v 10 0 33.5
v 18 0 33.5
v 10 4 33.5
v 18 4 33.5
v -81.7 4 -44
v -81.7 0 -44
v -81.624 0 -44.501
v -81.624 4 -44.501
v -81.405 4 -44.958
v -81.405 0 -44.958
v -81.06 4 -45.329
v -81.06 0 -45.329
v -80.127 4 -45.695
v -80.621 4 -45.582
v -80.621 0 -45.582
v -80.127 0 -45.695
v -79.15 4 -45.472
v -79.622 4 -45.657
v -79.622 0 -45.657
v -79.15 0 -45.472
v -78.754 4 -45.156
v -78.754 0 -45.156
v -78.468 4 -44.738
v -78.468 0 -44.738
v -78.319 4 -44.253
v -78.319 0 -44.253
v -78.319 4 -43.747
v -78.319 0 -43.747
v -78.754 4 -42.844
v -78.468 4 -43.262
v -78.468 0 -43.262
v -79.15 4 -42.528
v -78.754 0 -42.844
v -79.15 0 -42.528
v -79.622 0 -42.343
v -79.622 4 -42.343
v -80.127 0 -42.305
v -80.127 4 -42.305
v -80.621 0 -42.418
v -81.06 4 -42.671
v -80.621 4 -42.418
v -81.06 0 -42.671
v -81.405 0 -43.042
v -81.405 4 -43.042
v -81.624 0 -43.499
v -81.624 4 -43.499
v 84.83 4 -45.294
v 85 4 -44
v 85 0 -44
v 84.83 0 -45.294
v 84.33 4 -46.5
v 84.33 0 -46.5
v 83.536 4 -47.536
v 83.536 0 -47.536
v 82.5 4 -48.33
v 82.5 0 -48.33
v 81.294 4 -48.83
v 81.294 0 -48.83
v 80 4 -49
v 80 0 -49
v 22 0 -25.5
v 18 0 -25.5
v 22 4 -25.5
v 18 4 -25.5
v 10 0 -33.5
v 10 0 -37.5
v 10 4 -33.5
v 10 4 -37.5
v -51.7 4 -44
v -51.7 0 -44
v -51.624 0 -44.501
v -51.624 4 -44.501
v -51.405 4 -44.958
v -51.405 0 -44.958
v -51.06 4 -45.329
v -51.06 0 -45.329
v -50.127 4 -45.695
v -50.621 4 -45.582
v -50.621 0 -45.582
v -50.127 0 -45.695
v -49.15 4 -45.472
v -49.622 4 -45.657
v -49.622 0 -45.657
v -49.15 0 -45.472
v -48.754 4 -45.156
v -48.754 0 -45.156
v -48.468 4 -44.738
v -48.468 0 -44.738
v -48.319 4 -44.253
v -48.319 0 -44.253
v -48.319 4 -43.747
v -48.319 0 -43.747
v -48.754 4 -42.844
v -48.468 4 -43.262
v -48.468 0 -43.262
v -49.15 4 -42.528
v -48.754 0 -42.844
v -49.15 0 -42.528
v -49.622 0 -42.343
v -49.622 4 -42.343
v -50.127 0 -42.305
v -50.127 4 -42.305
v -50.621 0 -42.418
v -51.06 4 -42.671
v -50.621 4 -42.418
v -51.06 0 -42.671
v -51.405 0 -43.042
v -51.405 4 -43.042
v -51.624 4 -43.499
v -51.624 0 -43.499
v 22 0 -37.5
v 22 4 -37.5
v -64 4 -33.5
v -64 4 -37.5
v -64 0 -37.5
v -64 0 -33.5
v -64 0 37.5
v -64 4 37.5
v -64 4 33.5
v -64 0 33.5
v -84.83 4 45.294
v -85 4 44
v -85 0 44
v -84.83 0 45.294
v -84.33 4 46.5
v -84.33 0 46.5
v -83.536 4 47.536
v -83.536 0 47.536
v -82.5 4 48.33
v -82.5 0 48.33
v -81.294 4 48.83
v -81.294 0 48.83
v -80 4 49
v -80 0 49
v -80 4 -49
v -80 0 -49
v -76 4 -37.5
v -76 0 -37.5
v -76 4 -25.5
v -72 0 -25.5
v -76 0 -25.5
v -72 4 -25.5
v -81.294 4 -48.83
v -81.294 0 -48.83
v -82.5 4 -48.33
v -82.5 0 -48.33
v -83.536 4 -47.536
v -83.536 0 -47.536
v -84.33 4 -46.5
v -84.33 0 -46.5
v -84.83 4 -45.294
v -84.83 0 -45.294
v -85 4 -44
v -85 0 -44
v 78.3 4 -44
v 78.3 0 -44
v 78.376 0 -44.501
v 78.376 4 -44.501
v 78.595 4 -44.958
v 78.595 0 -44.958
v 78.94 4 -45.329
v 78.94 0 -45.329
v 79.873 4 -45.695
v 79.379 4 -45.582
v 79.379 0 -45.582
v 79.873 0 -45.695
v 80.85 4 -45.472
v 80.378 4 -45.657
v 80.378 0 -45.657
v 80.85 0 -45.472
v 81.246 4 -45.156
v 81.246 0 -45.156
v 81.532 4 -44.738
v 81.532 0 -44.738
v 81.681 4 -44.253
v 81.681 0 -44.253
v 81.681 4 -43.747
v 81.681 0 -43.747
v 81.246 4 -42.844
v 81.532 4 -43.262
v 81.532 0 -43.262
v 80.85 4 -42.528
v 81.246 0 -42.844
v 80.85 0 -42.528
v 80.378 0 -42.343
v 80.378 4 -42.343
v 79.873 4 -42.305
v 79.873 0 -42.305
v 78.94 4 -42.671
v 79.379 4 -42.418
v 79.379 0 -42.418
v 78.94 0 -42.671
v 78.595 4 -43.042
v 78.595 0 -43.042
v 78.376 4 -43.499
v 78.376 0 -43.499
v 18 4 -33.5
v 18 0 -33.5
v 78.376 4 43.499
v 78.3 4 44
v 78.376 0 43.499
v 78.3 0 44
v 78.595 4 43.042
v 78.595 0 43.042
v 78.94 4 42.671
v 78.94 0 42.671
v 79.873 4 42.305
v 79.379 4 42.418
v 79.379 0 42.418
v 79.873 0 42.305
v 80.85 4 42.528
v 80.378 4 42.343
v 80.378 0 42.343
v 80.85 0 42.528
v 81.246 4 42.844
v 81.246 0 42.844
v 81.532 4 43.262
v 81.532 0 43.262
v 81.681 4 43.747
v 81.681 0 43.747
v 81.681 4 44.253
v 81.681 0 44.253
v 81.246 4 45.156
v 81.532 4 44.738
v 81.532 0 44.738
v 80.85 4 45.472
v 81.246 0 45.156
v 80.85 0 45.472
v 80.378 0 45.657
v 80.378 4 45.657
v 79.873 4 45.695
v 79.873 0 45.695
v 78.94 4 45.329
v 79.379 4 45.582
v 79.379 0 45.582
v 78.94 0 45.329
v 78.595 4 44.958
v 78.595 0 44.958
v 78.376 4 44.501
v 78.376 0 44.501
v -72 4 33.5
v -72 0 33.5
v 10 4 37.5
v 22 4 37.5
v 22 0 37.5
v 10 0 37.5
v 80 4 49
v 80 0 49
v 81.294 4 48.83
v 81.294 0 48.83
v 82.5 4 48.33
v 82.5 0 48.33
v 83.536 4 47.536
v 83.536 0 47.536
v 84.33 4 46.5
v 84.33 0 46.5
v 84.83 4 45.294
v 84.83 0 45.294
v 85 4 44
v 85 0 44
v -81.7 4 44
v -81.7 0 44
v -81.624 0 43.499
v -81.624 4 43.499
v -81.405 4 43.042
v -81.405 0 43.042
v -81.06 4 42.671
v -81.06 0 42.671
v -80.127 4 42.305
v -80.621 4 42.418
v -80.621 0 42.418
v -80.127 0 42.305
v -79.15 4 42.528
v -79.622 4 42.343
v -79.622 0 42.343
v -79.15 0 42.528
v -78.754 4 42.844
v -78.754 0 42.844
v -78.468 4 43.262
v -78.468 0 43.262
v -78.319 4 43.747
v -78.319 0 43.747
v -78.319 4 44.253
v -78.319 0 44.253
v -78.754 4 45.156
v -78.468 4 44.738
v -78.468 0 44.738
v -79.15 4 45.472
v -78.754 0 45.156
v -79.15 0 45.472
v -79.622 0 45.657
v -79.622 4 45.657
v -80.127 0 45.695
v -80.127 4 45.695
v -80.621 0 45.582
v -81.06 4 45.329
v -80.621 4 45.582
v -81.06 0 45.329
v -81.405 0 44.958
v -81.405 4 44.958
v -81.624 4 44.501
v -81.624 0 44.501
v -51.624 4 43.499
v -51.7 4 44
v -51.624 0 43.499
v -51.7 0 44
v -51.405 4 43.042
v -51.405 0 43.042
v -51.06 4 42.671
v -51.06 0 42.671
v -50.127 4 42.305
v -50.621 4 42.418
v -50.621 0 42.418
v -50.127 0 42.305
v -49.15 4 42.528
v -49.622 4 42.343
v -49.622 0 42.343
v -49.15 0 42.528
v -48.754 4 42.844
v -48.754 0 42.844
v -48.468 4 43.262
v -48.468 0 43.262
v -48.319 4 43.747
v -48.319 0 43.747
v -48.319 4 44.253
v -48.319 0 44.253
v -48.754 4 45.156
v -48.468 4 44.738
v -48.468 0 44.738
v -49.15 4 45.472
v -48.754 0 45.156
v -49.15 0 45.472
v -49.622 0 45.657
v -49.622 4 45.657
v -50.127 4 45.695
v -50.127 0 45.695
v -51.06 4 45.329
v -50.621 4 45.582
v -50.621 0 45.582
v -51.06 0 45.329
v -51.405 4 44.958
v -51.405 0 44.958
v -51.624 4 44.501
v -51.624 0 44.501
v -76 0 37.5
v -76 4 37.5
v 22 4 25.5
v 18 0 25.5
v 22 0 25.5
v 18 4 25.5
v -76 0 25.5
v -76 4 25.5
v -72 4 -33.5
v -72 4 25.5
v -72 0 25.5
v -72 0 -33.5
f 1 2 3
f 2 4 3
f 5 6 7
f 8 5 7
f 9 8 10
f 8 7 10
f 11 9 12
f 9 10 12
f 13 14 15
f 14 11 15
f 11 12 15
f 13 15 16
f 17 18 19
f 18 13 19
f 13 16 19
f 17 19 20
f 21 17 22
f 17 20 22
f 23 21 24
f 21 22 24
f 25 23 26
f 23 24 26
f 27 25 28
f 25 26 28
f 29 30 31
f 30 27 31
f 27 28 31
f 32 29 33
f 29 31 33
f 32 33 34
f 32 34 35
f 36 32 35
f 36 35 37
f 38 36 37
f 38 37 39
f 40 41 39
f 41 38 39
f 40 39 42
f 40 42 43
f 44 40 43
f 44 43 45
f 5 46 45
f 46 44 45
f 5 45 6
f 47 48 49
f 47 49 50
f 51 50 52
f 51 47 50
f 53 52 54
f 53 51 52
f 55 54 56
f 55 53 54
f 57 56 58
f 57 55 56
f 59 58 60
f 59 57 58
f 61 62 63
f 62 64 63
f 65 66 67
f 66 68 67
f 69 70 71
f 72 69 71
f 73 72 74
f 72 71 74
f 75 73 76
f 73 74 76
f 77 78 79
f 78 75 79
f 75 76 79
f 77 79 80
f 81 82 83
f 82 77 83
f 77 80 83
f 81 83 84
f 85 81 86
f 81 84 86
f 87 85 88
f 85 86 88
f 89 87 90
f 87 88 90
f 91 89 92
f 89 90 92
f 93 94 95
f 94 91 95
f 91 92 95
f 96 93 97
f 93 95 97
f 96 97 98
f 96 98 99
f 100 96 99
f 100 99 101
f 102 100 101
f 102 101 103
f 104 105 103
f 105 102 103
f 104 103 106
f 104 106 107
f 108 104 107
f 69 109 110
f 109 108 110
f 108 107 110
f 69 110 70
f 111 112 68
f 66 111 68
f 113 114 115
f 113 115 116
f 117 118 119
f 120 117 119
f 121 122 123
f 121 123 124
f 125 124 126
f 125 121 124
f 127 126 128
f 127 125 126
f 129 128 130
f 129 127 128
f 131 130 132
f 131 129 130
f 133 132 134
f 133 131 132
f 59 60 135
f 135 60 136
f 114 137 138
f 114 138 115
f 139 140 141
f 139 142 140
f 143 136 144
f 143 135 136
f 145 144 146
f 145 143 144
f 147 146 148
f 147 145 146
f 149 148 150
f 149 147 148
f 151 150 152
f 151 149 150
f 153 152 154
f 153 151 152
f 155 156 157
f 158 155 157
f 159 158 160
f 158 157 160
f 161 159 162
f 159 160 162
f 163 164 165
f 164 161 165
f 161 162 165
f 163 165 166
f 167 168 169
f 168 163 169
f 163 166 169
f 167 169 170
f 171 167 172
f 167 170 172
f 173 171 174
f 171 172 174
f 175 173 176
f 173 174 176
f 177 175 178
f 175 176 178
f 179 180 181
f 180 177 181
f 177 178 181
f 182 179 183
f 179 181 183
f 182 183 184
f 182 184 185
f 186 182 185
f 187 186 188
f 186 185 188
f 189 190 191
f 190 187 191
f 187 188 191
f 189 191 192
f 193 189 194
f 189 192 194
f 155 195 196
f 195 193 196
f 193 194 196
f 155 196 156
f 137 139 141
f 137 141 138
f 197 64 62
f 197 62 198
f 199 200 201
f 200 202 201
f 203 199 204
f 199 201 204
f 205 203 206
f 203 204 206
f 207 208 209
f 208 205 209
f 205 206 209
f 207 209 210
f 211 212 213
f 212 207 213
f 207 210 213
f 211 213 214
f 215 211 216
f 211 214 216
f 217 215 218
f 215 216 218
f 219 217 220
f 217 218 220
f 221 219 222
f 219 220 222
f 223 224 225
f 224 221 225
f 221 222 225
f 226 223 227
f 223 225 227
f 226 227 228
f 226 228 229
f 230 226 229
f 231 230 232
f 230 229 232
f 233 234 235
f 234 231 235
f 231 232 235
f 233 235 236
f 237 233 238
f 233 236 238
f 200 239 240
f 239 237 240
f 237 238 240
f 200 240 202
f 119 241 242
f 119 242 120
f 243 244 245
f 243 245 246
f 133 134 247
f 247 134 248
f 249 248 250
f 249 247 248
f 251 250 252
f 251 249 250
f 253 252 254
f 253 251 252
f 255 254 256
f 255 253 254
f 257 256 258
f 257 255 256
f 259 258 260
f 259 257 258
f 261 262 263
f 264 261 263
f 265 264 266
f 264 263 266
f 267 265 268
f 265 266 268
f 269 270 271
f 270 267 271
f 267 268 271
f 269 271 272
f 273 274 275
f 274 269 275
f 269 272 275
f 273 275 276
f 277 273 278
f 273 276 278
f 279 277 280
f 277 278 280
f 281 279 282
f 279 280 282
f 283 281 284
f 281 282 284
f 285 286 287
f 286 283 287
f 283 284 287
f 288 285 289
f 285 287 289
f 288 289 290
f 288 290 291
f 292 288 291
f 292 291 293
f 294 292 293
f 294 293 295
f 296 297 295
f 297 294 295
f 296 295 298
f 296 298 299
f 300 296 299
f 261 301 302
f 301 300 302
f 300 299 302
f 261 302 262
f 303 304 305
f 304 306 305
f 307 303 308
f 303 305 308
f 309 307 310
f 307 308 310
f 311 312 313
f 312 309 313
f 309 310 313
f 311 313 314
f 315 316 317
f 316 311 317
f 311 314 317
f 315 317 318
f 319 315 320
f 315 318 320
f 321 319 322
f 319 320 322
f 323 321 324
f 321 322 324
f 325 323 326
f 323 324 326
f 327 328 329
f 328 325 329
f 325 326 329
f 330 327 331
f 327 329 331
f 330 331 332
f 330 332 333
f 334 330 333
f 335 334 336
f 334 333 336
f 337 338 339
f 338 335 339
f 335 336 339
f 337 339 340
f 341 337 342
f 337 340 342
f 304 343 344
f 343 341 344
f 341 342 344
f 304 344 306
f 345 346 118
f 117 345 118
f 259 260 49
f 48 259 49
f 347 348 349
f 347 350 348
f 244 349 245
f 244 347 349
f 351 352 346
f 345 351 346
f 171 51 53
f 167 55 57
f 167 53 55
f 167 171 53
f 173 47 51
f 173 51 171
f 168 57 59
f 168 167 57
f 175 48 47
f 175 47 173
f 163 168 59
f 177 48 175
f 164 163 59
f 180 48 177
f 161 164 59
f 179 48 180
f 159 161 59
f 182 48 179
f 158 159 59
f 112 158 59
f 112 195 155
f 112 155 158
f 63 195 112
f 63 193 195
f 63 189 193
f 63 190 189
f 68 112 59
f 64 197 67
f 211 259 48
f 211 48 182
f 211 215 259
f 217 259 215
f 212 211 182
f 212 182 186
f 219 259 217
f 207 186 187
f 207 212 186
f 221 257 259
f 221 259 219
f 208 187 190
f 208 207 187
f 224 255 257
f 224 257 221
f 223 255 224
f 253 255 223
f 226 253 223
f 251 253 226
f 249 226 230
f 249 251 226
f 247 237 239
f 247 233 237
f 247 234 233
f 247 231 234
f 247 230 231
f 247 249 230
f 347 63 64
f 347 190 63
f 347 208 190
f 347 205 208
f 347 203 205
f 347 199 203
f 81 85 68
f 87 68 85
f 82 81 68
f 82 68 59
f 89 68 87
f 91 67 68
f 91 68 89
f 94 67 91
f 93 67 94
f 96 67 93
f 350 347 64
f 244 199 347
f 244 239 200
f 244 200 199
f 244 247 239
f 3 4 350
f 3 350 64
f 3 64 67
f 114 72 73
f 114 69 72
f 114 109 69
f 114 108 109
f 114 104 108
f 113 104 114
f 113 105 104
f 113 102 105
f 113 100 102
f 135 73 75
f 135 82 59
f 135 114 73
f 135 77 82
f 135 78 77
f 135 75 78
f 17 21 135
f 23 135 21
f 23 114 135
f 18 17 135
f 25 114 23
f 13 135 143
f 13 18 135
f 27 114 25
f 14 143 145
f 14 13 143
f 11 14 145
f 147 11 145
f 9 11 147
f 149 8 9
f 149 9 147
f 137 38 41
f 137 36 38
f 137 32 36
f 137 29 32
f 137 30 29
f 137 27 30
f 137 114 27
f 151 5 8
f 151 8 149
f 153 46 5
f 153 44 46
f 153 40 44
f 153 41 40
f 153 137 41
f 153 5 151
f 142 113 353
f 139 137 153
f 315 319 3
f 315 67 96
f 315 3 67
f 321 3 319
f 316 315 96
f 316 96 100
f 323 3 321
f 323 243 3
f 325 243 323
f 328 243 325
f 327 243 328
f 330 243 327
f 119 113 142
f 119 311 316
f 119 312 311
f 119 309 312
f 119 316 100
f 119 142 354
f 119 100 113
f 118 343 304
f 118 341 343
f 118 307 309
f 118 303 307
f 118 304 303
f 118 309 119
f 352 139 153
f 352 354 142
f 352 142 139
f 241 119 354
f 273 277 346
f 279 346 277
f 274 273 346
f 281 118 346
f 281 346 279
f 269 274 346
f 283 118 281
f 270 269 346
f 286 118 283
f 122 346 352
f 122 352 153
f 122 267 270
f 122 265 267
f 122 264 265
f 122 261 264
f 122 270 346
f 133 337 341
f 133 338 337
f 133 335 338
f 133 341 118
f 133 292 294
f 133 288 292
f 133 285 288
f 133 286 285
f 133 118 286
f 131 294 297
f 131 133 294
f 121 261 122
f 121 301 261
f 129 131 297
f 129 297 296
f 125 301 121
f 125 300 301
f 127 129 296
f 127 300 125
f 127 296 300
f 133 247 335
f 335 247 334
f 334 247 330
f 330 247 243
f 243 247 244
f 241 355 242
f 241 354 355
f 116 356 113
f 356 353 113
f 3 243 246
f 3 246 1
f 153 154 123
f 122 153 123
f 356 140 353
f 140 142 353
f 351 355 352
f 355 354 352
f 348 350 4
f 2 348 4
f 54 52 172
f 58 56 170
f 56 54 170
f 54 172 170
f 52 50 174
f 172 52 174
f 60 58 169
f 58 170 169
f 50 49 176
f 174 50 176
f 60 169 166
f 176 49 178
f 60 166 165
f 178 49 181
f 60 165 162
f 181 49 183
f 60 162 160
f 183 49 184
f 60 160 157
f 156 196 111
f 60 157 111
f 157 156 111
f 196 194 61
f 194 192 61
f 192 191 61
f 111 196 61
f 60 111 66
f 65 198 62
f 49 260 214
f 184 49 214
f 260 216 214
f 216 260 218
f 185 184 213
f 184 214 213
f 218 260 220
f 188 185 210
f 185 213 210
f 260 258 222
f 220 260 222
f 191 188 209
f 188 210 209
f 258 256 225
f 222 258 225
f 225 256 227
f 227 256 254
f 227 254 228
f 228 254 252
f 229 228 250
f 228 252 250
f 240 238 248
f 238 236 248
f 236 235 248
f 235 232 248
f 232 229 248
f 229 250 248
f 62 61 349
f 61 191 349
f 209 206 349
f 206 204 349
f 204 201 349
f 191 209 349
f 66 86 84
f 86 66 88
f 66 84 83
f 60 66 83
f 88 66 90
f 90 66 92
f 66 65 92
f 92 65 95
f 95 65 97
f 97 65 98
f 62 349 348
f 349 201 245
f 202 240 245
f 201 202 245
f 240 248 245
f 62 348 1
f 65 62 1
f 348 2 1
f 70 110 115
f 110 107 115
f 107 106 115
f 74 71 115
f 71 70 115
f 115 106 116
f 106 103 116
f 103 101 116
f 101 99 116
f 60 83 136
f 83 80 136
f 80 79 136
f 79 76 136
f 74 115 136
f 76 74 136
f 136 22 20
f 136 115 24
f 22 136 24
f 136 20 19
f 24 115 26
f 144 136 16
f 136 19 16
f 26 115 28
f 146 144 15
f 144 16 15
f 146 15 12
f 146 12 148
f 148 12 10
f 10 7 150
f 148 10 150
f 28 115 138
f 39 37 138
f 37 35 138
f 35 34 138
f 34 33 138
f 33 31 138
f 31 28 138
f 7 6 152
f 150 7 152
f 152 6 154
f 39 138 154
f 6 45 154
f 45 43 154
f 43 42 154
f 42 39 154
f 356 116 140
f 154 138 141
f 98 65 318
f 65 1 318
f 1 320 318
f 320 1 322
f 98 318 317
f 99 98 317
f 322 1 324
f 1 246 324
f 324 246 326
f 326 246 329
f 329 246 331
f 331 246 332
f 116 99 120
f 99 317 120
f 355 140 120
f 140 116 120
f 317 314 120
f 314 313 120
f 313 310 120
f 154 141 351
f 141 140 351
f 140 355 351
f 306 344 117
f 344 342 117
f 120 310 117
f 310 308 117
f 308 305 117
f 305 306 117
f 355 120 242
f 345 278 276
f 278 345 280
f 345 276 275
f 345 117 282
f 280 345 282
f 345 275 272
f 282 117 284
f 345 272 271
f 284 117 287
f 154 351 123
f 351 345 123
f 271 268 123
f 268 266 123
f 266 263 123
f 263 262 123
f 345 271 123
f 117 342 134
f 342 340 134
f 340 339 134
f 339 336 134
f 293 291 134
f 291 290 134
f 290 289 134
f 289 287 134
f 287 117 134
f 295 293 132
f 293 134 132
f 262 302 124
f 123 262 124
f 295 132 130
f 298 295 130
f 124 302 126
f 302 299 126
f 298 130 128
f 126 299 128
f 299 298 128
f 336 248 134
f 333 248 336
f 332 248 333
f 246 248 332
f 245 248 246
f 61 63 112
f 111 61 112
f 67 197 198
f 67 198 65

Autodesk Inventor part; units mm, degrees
ref_plane "YZ Plane" through (0, 0, 0) normal (1, 0, 0) x (0, 1, 0)
ref_plane "XZ Plane" through (0, 0, 0) normal (0, 1, 0) x (-1, 0, 0)
ref_plane "XY Plane" through (0, 0, 0) normal (0, 0, 1) x (1, 0, 0)
sketch "Sketch1" plane through (0, 0, 0) normal (0, 1, 0) x (-1, 0, 0)
  line L0 (85, 49) -> (-85, 49)
  line L1 (-85, 49) -> (-85, -49)
  line L2 (-85, -49) -> (85, -49)
  line L3 (85, -49) -> (85, 49)
  line L4 (85, 49) -> (-85, -49) construction
  line L5 (-85, 49) -> (85, -49) construction
  circle A0 centre (80, -44) radius 1.7
  circle A1 centre (80, 44) radius 1.7
  circle A2 centre (-80, -44) radius 1.7
  circle A3 centre (-80, 44) radius 1.7
  circle A4 centre (50, -44) radius 1.7
  circle A5 centre (50, 44) radius 1.7
  point P0 (0, 0)
  dimension "d0" = 170
  dimension "d1" = 98
  dimension "d2" = 5
  dimension "d3" = 5
  dimension "d4" = 3.4
  dimension "d7" = 88
  dimension "d10" = 160
  dimension "d25" = 30
extrude "Extrusion1" add sketch "Sketch1" along normal blind 4
fillet "Fillet1" radius 5 4 edges at (85, 2, 49) (85, 2, -49) (-85, 2, 49) (-85, 2, -49)
sketch "Sketch2" plane through (0, 4, 0) normal (0, 1, 0) x (1, 0, 0)
  line L0 (-85, 44) -> (-85, -44) projected
  line L1 (-72, -33.5) -> (-62, -33.5)
  line L2 (-72, -37.5) -> (-72, -33.5)
  line L3 (-72, -23.5) -> (-72, -37.5)
  line L4 (18, 33.5) -> (10, 33.5)
  line L5 (10, 33.5) -> (10, 25.5)
  line L6 (10, 25.5) -> (18, 25.5)
  line L7 (18, 25.5) -> (18, 33.5)
  line L8 (10, 25.5) -> (22, 25.5)
  line L9 (22, 25.5) -> (22, 37.5)
  line L10 (22, 37.5) -> (10, 37.5)
  line L11 (10, 37.5) -> (10, 25.5)
  line L12 (-72, -33.5) -> (-64, -33.5)
  line L13 (-64, -33.5) -> (-64, -25.5)
  line L14 (-64, -25.5) -> (-72, -25.5)
  line L15 (-72, -25.5) -> (-72, -33.5)
  line L16 (-64, -25.5) -> (-76, -25.5)
  line L17 (-76, -25.5) -> (-76, -37.5)
  line L18 (-76, -37.5) -> (-64, -37.5)
  line L19 (-64, -37.5) -> (-64, -25.5)
  line L20 (-25.0039, 0) -> (-47.7766, 0)
  line L21 (-72, 33.5) -> (-62, 33.5)
  line L22 (-72, 37.5) -> (-72, 33.5)
  line L23 (-72, 23.5) -> (-72, 37.5)
  line L24 (18, -33.5) -> (10, -33.5)
  line L25 (10, -33.5) -> (10, -25.5)
  line L26 (10, -25.5) -> (18, -25.5)
  line L27 (18, -25.5) -> (18, -33.5)
  line L28 (10, -25.5) -> (22, -25.5)
  line L29 (22, -25.5) -> (22, -37.5)
  line L30 (22, -37.5) -> (10, -37.5)
  line L31 (10, -37.5) -> (10, -25.5)
  line L32 (-72, 33.5) -> (-64, 33.5)
  line L33 (-64, 33.5) -> (-64, 25.5)
  line L34 (-64, 25.5) -> (-72, 25.5)
  line L35 (-72, 25.5) -> (-72, 33.5)
  line L36 (-64, 25.5) -> (-76, 25.5)
  line L37 (-76, 25.5) -> (-76, 37.5)
  line L38 (-76, 37.5) -> (-64, 37.5)
  line L39 (-64, 37.5) -> (-64, 25.5)
  point P0 (0, 0)
  point P1 (10, 33.5)
  point P2 (18, 25.5)
  dimension "d30" = 13
  dimension "d31" = 33.5
  dimension "d36" = 67
  dimension "d37" = 90
  dimension "d38" = 8
  dimension "d39" = 8
  dimension "d40" = 12
  dimension "d41" = 12
  dimension "d44" = 8
  dimension "d45" = 8
  dimension "d46" = 12
  dimension "d47" = 12
extrude "Extrusion2" cut sketch "Sketch2" against normal through all contours L1 L19 L18 L2 | L2 L18 L17 L16 L3 | L4 L11 L10 L9 L8 L7 | L22 L38 L39 L21 | L23 L36 L37 L38 L22 | L27 L28 L29 L30 L31 L24
sketch "Sketch3" plane through (0, 4, 0) normal (0, 1, 0) x (1, 0, 0)
  line L0 (-64, -33.5) -> (-64, -37.5) projected
  line L1 (-64, -37.5) -> (-76, -37.5) projected
  line L2 (-76, -37.5) -> (-76, -25.5) projected
  line L3 (-76, -25.5) -> (-72, -25.5) projected
  line L4 (-72, -25.5) -> (-72, -33.5) projected
  line L5 (-72, -33.5) -> (-64, -33.5) projected
  line L6 (18, -25.5) -> (22, -25.5) projected
  line L7 (22, -25.5) -> (22, -37.5) projected
  line L8 (22, -37.5) -> (10, -37.5) projected
  line L9 (10, -37.5) -> (10, -33.5) projected
  line L10 (10, -33.5) -> (18, -33.5) projected
  line L11 (18, -33.5) -> (18, -25.5) projected
  line L12 (18, 33.5) -> (10, 33.5) projected
  line L13 (10, 33.5) -> (10, 37.5) projected
  line L14 (10, 37.5) -> (22, 37.5) projected
  line L15 (22, 37.5) -> (22, 25.5) projected
  line L16 (22, 25.5) -> (18, 25.5) projected
  line L17 (18, 25.5) -> (18, 33.5) projected
  line L18 (-76, 25.5) -> (-76, 37.5) projected
  line L19 (-76, 37.5) -> (-64, 37.5) projected
  line L20 (-64, 37.5) -> (-64, 33.5) projected
  line L21 (-64, 33.5) -> (-72, 33.5) projected
  line L22 (-72, 33.5) -> (-72, 25.5) projected
  line L23 (-72, 25.5) -> (-76, 25.5) projected
  arc A0 (-80, 49) -> (-85, 44) centre (-80, 44) ccw projected
  line L24 (-85, 44) -> (-85, -44) projected
  arc A1 (-85, -44) -> (-80, -49) centre (-80, -44) ccw projected
  line L25 (-80, -49) -> (80, -49) projected
  arc A2 (80, -49) -> (85, -44) centre (80, -44) ccw projected
  line L26 (85, -44) -> (85, 44) projected
  arc A3 (85, 44) -> (80, 49) centre (80, 44) ccw projected
  line L27 (80, 49) -> (-80, 49) projected
  circle A4 centre (-80, 44) radius 1.7 projected
  circle A5 centre (-80, -44) radius 1.7 projected
  circle A6 centre (80, 44) radius 1.7 projected
  circle A7 centre (80, -44) radius 1.7 projected
  circle A8 centre (-50, 44) radius 1.7 projected
  circle A9 centre (-50, -44) radius 1.7 projected
  point P0 (0, 0)
equation "\"d39\" = d38"
equation "\"d41\" = d40"
equation "\"d44\" = d39"
equation "\"d45\" = d44"
equation "\"d46\" = d41"
equation "\"d47\" = d41"
properties part number "upper_plate" material "MDF Medium Density Fiberboard"
